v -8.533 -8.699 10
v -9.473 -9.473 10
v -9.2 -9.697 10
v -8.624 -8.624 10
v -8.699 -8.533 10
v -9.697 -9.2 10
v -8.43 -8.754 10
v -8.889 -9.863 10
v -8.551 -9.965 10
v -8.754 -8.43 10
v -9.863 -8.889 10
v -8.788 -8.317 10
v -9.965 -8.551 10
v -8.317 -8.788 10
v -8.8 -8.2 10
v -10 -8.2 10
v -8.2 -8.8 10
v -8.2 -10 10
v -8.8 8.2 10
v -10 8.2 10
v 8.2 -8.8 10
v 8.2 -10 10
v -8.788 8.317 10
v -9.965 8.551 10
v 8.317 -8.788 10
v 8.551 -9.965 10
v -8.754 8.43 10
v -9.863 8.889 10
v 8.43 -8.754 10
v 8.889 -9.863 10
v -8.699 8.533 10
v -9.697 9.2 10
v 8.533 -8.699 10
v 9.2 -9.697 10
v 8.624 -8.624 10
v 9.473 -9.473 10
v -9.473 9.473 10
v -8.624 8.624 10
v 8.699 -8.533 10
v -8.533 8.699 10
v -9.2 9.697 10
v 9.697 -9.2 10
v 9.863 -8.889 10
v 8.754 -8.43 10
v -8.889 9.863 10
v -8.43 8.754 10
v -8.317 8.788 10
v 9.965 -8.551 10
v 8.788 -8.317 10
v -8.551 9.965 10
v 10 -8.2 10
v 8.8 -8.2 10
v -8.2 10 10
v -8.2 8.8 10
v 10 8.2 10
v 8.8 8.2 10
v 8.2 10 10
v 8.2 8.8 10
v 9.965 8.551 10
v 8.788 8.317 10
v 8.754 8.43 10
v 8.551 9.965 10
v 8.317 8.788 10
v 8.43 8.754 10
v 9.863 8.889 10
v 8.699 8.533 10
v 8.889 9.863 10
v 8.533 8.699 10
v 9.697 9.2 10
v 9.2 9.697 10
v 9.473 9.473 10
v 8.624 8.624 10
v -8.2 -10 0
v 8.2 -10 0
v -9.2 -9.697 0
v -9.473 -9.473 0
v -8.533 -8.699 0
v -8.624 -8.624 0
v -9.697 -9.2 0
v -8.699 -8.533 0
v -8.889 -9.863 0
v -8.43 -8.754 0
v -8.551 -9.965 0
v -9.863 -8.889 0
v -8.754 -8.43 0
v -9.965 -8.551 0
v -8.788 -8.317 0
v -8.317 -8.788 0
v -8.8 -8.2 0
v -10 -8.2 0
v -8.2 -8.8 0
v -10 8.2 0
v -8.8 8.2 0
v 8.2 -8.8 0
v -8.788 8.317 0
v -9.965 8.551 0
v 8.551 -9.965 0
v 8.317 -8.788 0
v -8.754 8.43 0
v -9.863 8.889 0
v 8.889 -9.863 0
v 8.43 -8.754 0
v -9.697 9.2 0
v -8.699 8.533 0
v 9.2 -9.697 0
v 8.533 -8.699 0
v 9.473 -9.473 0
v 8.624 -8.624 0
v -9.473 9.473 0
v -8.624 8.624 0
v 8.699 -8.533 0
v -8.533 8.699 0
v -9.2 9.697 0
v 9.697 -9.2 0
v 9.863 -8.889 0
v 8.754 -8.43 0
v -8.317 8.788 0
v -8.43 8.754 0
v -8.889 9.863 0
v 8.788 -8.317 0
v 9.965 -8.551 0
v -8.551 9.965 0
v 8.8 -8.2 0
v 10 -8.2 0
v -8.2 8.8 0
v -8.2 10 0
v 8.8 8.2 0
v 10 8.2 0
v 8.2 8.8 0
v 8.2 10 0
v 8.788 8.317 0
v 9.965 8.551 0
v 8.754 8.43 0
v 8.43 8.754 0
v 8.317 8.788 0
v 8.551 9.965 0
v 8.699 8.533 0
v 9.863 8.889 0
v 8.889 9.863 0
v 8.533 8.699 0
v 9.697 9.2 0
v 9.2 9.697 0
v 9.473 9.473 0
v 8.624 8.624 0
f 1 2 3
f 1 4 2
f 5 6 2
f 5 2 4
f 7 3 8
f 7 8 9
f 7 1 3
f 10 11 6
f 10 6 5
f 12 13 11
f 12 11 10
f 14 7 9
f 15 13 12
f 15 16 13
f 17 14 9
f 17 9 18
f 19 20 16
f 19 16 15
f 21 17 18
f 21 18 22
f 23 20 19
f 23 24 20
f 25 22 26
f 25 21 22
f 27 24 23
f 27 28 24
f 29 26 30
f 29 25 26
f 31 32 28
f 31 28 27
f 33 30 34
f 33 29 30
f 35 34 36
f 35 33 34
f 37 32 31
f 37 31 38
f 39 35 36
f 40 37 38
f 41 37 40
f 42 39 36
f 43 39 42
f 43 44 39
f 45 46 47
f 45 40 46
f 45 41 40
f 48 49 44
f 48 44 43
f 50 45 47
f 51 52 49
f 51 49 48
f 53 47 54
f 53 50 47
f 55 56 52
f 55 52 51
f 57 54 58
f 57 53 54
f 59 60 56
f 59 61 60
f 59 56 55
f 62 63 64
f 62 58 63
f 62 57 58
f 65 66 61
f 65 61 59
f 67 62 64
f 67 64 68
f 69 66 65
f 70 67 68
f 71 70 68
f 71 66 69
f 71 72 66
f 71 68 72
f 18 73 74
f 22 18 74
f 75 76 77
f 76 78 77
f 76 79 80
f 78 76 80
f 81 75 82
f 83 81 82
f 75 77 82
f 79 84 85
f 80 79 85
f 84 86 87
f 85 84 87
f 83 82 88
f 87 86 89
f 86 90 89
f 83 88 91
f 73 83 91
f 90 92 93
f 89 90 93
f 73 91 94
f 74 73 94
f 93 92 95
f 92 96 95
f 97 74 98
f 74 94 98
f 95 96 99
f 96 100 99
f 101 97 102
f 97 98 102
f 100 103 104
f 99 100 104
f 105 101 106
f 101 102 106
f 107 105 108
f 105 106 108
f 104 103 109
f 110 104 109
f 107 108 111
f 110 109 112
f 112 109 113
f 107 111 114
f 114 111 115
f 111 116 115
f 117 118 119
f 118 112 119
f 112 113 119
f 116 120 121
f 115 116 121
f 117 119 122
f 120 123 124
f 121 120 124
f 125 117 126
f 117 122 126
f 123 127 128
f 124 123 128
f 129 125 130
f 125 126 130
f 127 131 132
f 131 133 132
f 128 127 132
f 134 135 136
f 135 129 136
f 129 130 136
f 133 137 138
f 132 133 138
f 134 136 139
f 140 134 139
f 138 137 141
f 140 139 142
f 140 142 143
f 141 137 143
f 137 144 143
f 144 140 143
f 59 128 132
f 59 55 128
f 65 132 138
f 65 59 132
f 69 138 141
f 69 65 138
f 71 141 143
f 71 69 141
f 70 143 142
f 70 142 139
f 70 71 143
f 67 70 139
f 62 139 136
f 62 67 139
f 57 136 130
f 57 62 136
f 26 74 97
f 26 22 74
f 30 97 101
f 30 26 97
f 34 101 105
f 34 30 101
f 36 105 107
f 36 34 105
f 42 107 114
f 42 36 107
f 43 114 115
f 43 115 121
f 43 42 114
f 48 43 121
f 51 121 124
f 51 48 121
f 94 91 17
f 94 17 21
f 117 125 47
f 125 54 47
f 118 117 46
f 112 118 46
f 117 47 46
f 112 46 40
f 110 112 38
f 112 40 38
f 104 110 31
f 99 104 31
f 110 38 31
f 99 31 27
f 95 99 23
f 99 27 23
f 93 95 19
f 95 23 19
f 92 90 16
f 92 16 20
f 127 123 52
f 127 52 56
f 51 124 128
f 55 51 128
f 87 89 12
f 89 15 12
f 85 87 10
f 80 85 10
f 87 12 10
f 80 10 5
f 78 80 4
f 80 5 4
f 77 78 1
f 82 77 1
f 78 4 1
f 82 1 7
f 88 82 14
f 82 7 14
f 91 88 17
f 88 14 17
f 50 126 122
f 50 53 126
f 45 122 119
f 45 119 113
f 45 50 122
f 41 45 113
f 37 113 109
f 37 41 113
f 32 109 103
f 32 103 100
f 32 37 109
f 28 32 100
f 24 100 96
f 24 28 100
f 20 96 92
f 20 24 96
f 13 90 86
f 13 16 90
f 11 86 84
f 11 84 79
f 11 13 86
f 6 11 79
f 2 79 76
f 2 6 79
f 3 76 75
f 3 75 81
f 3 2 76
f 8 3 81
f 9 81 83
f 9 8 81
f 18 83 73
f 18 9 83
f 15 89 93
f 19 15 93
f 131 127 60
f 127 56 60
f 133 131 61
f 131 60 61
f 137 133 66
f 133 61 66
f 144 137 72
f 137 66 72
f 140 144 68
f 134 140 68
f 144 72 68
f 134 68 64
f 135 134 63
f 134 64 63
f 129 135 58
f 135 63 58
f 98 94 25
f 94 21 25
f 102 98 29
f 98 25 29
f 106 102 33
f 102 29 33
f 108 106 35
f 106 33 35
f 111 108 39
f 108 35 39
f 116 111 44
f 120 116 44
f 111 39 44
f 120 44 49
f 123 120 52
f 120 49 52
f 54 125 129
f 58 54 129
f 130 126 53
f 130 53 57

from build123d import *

# Parameters (mm, degrees)
F0_W     = 20
F0_H     = 20
F0_W_2   = 17.6
F0_H_2   = 17.6
F1_DEPTH = 10
F2_R     = 1.8
F3_R     = 1.8
F4_R     = 1.8
F5_R     = 1.8
F6_R     = 0.6
F7_R     = 0.6
F8_R     = 0.6
F9_R     = 0.6


with BuildPart() as f1:
    # F0 (on Top) → F1 (new body)
    with BuildSketch(Plane.XY):
        Rectangle(F0_W, F0_H)
        Rectangle(F0_W_2, F0_H_2, mode=Mode.SUBTRACT)
    extrude(amount=F1_DEPTH)

    # F2
    f2_edges = [f1.edges().sort_by_distance(p)[0] for p in [
        (10, -10, 5),
    ]]
    fillet(f2_edges, radius=F2_R)

    # F3
    f3_edges = [f1.edges().sort_by_distance(p)[0] for p in [
        (10, 10, 5),
    ]]
    fillet(f3_edges, radius=F3_R)

    # F4
    f4_edges = [f1.edges().sort_by_distance(p)[0] for p in [
        (-10, 10, 5),
    ]]
    fillet(f4_edges, radius=F4_R)

    # F5
    f5_edges = [f1.edges().sort_by_distance(p)[0] for p in [
        (-10, -10, 5),
    ]]
    fillet(f5_edges, radius=F5_R)

    # F6
    f6_edges = [f1.edges().sort_by_distance(p)[0] for p in [
        (-8.8, 8.8, 5),
    ]]
    fillet(f6_edges, radius=F6_R)

    # F7
    f7_edges = [f1.edges().sort_by_distance(p)[0] for p in [
        (-8.8, -8.8, 5),
    ]]
    fillet(f7_edges, radius=F7_R)

    # F8
    f8_edges = [f1.edges().sort_by_distance(p)[0] for p in [
        (8.8, -8.8, 5),
    ]]
    fillet(f8_edges, radius=F8_R)

    # F9
    f9_edges = [f1.edges().sort_by_distance(p)[0] for p in [
        (8.8, 8.8, 5),
    ]]
    fillet(f9_edges, radius=F9_R)


solid = f1.part
